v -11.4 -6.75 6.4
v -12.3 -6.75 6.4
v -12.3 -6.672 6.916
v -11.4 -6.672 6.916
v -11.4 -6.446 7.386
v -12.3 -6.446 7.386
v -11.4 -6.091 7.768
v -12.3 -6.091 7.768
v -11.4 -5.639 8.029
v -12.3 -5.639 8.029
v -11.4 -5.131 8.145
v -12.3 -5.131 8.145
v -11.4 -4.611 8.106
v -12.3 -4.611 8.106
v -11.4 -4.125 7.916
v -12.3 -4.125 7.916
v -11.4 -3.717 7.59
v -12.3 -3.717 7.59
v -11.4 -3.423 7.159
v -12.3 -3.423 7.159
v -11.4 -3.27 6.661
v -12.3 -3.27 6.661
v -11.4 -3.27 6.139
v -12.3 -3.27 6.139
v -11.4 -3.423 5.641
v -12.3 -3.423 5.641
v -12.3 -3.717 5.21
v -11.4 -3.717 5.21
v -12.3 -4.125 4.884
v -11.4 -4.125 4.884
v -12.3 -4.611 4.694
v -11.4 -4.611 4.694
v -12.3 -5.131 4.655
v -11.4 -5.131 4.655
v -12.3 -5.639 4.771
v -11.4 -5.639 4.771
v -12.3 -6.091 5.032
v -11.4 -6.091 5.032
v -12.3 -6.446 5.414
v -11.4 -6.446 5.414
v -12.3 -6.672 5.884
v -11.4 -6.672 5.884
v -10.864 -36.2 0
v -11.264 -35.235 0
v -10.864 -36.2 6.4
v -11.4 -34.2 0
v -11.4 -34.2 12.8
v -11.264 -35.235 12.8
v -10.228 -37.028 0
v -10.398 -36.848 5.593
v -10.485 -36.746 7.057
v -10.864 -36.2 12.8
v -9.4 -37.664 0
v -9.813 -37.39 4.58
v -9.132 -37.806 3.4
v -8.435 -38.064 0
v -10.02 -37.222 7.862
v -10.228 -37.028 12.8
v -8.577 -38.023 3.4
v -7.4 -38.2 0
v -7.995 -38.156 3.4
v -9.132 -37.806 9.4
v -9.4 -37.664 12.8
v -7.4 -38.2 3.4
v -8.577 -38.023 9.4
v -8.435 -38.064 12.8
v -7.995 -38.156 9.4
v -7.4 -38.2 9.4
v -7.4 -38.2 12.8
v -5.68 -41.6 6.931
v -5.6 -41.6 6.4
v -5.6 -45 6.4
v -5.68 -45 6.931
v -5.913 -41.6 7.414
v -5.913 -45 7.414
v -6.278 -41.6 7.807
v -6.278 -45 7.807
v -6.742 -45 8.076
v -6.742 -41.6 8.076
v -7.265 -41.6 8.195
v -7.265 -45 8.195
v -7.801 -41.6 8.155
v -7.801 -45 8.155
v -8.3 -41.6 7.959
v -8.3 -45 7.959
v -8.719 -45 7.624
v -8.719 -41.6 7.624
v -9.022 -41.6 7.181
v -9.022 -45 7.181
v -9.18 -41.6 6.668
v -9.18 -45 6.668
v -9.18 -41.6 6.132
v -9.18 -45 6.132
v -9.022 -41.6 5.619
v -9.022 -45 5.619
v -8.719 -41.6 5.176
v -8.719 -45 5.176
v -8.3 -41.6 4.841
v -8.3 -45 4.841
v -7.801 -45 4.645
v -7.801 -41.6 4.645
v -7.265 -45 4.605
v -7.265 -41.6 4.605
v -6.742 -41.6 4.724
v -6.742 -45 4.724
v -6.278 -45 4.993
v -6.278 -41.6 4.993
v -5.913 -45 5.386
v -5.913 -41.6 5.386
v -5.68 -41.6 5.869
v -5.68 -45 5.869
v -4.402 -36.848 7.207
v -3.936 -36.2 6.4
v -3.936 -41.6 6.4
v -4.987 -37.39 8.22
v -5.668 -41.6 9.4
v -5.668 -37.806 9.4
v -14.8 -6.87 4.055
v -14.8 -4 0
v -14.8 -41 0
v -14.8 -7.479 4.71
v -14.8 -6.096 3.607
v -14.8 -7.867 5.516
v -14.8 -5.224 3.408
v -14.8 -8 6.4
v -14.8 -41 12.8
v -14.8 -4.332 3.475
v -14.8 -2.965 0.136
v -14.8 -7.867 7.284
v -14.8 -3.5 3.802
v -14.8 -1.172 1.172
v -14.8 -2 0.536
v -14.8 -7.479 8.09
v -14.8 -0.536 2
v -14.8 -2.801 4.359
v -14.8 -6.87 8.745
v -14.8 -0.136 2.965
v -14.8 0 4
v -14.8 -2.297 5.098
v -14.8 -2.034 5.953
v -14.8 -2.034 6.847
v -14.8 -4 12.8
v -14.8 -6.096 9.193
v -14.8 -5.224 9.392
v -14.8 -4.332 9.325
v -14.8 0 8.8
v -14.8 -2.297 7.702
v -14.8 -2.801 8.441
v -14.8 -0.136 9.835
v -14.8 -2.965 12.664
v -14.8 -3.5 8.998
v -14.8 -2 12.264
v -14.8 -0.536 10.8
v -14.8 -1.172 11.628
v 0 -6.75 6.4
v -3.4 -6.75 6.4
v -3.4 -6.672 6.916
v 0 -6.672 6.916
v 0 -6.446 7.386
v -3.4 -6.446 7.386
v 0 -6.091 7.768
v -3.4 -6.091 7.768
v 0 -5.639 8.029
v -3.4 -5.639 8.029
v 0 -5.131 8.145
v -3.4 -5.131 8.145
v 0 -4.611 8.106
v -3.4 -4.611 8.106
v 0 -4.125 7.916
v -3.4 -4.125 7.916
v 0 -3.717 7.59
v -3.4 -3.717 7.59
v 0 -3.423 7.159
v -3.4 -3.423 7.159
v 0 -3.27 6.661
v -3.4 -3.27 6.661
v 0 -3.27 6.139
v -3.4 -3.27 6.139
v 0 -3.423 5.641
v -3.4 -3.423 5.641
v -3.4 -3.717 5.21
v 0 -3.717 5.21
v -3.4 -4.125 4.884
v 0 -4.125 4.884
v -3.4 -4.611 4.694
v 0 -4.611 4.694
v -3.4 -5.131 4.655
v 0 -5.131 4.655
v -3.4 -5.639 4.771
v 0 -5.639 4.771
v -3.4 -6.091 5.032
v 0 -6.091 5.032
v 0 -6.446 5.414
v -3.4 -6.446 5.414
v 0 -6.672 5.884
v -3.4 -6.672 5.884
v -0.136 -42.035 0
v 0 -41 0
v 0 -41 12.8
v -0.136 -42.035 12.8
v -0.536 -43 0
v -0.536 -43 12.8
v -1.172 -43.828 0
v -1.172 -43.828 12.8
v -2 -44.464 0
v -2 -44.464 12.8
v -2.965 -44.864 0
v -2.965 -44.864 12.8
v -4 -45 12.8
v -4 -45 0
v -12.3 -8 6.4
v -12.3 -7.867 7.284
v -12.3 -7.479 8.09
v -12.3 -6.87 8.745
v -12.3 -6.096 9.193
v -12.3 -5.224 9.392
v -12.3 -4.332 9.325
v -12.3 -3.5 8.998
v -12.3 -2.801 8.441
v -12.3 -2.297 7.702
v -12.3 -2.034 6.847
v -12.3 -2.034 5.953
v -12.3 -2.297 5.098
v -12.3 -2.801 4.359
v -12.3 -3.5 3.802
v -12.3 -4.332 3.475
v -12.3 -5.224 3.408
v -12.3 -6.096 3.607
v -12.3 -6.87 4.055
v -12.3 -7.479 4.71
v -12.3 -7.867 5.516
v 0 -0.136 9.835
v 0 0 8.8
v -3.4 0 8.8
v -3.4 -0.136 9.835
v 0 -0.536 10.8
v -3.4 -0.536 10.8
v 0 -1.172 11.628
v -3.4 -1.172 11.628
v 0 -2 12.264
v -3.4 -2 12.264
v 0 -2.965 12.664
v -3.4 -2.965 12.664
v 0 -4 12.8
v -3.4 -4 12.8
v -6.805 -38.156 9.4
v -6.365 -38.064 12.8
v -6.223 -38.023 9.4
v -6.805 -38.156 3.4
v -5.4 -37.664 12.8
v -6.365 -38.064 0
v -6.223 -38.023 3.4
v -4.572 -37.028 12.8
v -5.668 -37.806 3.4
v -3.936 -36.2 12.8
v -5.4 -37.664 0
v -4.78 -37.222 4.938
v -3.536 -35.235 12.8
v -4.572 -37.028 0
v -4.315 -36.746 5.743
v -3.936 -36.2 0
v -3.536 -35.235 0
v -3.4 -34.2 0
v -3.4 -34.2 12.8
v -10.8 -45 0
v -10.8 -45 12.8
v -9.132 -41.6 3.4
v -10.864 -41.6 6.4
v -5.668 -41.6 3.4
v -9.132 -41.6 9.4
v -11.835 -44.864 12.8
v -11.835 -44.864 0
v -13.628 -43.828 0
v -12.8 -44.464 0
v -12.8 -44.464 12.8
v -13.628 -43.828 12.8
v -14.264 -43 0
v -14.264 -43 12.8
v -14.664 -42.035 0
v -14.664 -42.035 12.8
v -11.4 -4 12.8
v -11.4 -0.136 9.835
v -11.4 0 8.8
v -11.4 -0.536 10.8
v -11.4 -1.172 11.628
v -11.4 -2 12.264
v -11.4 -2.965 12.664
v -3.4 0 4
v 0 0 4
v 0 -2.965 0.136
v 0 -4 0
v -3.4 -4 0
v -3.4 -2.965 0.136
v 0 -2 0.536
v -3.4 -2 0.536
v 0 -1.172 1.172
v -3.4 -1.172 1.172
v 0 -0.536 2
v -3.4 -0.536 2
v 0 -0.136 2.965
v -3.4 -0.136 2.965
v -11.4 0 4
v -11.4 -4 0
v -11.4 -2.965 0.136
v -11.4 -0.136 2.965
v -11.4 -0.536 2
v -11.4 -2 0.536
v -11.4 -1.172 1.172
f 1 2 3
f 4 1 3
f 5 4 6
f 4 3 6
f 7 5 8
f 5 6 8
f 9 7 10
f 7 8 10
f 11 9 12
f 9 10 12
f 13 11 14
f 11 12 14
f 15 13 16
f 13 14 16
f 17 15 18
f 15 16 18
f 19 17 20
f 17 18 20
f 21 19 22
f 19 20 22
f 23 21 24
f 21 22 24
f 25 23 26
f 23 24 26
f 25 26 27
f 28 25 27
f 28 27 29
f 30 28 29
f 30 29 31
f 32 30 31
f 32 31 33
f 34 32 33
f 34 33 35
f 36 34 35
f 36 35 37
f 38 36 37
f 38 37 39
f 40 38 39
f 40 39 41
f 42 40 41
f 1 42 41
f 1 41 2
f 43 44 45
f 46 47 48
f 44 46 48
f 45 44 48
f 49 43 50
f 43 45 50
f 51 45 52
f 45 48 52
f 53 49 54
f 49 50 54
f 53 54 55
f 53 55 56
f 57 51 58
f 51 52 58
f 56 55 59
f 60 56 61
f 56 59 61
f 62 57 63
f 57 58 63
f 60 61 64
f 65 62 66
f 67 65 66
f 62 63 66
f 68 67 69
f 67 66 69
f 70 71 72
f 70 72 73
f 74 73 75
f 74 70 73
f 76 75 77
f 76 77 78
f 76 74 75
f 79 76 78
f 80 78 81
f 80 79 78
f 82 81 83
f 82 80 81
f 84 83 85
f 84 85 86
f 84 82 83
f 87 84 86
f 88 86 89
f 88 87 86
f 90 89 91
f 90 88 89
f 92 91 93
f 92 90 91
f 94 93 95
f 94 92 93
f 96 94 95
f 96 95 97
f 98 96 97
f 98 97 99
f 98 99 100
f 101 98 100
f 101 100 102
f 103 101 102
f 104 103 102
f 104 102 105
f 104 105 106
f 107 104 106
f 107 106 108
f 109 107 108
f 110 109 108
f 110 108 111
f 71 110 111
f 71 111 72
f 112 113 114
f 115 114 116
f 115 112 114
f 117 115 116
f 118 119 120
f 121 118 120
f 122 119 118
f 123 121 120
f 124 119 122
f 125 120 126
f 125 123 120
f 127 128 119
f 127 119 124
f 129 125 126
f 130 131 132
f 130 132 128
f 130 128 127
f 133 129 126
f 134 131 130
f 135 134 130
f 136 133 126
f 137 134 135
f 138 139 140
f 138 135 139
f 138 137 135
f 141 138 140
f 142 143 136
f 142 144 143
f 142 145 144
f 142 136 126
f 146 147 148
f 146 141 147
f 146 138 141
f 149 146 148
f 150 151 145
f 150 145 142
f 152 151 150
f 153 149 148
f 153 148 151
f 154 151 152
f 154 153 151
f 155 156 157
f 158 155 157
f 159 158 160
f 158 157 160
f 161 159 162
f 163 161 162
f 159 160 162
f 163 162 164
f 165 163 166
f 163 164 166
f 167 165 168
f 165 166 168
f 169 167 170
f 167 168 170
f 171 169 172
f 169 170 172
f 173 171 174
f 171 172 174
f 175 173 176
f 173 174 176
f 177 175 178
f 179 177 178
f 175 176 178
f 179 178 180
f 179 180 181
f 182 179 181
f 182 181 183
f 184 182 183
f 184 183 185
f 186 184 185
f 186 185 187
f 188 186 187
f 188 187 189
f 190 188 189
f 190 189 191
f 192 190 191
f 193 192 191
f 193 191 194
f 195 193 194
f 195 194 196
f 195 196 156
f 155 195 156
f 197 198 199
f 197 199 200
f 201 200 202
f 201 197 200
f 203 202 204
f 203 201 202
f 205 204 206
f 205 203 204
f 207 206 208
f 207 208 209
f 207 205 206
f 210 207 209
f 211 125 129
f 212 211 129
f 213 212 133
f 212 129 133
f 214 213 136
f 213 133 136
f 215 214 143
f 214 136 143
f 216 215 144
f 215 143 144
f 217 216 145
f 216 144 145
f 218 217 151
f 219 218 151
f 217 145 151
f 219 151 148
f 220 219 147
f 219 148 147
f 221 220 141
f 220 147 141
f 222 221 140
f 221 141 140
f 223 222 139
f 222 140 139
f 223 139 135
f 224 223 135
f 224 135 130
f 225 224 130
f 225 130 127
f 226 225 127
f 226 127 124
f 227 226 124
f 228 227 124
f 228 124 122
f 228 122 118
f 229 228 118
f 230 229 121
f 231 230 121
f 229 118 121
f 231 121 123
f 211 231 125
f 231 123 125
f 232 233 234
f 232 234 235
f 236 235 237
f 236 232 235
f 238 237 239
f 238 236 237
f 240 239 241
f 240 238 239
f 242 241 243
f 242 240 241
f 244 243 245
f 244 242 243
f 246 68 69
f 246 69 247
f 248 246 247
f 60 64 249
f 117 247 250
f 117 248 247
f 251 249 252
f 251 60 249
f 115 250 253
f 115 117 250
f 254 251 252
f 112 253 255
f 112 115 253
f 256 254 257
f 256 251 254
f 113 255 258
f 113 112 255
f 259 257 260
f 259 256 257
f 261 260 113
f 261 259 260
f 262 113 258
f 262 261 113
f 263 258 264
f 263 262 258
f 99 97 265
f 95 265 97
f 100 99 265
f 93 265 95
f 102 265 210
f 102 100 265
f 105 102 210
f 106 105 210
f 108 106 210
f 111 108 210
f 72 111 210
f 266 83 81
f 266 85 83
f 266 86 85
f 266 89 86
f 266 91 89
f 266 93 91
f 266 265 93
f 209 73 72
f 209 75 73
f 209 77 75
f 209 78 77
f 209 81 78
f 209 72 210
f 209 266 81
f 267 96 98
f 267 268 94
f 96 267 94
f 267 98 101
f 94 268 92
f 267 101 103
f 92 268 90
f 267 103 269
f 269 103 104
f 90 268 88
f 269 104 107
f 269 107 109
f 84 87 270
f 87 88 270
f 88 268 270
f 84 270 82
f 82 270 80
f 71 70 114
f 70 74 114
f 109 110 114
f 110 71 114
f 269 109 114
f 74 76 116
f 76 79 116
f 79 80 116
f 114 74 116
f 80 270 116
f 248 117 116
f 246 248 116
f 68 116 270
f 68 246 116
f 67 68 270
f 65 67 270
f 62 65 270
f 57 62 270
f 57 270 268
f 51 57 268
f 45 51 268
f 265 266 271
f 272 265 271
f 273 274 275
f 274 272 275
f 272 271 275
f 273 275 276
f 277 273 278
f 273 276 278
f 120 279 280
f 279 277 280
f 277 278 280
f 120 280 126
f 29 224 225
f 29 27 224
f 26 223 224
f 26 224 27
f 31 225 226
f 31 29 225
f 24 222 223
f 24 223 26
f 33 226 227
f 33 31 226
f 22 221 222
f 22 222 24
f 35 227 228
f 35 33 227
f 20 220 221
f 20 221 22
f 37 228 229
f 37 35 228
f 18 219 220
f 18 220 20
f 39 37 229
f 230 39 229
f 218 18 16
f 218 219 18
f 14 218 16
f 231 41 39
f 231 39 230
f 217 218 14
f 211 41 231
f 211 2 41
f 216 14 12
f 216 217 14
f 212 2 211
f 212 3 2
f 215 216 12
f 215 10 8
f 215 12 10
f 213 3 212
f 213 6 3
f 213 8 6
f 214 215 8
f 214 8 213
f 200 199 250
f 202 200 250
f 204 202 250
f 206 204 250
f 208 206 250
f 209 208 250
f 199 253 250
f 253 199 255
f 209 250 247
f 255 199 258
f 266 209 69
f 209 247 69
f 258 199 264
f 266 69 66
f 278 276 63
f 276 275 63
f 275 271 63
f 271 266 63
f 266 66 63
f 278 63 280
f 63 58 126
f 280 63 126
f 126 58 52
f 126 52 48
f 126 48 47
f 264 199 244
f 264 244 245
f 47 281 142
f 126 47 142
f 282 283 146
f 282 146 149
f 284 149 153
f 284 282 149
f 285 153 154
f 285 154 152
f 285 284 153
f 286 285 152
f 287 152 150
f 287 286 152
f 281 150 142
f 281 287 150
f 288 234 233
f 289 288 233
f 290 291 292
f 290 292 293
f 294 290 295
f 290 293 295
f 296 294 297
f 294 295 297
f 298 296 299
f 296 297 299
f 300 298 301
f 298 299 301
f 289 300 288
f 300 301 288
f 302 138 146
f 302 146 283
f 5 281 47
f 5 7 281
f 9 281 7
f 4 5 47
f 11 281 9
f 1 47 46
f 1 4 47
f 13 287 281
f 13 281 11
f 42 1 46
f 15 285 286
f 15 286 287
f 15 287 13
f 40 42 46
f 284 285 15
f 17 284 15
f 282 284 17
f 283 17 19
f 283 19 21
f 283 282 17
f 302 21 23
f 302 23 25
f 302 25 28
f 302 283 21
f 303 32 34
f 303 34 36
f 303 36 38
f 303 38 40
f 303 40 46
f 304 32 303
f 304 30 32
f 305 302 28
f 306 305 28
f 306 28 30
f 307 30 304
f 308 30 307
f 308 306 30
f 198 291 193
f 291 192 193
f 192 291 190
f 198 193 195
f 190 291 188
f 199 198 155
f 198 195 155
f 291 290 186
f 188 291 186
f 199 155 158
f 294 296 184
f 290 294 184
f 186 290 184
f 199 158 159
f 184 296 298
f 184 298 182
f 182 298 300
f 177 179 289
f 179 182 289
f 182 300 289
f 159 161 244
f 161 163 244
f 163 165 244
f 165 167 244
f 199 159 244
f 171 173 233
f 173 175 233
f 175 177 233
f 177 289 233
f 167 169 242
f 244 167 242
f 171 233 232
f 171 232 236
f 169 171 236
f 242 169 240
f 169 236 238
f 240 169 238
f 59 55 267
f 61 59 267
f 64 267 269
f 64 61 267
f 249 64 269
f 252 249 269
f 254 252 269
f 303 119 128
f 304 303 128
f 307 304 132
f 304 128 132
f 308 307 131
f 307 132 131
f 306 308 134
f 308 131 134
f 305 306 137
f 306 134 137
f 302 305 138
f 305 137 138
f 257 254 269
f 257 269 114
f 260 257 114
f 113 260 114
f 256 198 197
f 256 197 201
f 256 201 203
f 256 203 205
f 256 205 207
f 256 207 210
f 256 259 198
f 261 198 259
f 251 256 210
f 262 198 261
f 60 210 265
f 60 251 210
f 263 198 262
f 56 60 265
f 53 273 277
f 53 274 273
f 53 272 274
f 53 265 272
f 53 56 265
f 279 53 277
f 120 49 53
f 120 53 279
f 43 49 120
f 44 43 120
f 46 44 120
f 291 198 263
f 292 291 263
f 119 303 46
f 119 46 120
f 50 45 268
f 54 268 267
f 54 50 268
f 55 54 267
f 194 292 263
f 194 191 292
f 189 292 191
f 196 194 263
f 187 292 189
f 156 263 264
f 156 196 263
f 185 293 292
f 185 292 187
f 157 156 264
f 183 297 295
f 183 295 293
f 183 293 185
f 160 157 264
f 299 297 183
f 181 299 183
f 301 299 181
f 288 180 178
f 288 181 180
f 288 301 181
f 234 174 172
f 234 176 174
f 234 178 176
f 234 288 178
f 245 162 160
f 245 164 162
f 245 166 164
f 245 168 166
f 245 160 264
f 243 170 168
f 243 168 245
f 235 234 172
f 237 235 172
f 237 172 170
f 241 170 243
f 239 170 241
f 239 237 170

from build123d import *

# Parameters (mm, degrees)
F0_W         = 3.4
F0_H         = 12.8
F0_W_2       = 8
F0_R         = 1.8
F1_DEPTH     = 45
F2_R         = 1.75
F3_DEPTH     = 25
F2_R_2       = 3
F4_DEPTH     = 2.5
F0_H_2       = 0.6
F5_DEPTH     = 38.2
F6_T3_DEPTH  = 12.8
F6_S4_R      = 1.8
F6_T5_DEPTH  = 8
F6_T8_DEPTH  = 12.8
F6_S9_R      = 1.8
F6_T10_DEPTH = 8
F6_T14_DEPTH = 23.4
F6_T17_DEPTH = 23.4
F6_T20_DEPTH = 23.4
F6_T23_DEPTH = 23.4
F6_T26_DEPTH = 32.8
F6_T29_DEPTH = 32.8
F7_DEPTH     = 41.6


# Not quite as in the source:
# - a fillet or chamfer that OpenCascade refuses, or shapes differently, is made with other operations: its cross-section is extruded or revolved along the edge and cut away or added


with BuildPart() as f1:
    # F0 (on Front) → F1 (new body)
    with BuildSketch(Plane.XZ):
        with Locations((-1.7, 6.4)):
            Rectangle(F0_W, F0_H)
        with Locations((-7.4, 6.4)):
            Rectangle(F0_W_2, F0_H)
        Polygon((-10.8641016151, 6.4), (-9.1320508076, 9.4), (-5.6679491924, 9.4), (-3.9358983849, 6.4), (-5.6679491924, 3.4), (-9.1320508076, 3.4), align=None, mode=Mode.SUBTRACT)
        with Locations((-13.1, 6.4)):
            Rectangle(F0_W, F0_H)
        Polygon((-5.6679491924, 9.4), (-9.1320508076, 9.4), (-10.8641016151, 6.4), (-9.1320508076, 3.4), (-5.6679491924, 3.4), (-3.9358983849, 6.4), align=None)
        with Locations((-7.4, 6.4)):
            Circle(F0_R, mode=Mode.SUBTRACT)
    extrude(amount=F1_DEPTH)

    # F2 (on face) → F3 (cut)
    with BuildSketch(Plane(origin=(-14.8, 0, 0), x_dir=(0, -1, 0), z_dir=(-1, 0, 0))):
        with Locations((5, 6.4)):
            Circle(F2_R)
    extrude(amount=-F3_DEPTH, mode=Mode.SUBTRACT)

    # F2 (on face) → F4 (cut)
    with BuildSketch(Plane(origin=(-14.8, 0, 0), x_dir=(0, -1, 0), z_dir=(-1, 0, 0))):
        with Locations((5, 6.4)):
            Circle(F2_R_2)
        with Locations((5, 6.4)):
            Circle(F2_R, mode=Mode.SUBTRACT)
    extrude(amount=-F4_DEPTH, mode=Mode.SUBTRACT)

    # F0 (on Front) → F5 (cut)
    with BuildSketch(Plane.XZ):
        with Locations((-7.4, 13.1)):
            Rectangle(F0_W_2, F0_H_2)
        with Locations((-7.4, 6.4)):
            Rectangle(F0_W_2, F0_H)
        Polygon((-10.8641016151, 6.4), (-9.1320508076, 9.4), (-5.6679491924, 9.4), (-3.9358983849, 6.4), (-5.6679491924, 3.4), (-9.1320508076, 3.4), align=None, mode=Mode.SUBTRACT)
        with Locations((-7.4, -0.3)):
            Rectangle(F0_W_2, F0_H_2)
        Polygon((-5.6679491924, 9.4), (-9.1320508076, 9.4), (-10.8641016151, 6.4), (-9.1320508076, 3.4), (-5.6679491924, 3.4), (-3.9358983849, 6.4), align=None)
        with Locations((-7.4, 6.4)):
            Circle(F0_R, mode=Mode.SUBTRACT)
    extrude(amount=F5_DEPTH, mode=Mode.SUBTRACT)

    # F6: fillet of radius 4 on 8 edges, made by hand


with BuildPart() as f6_tool1:
    # F6_s2 → F6_t3 (new body)
    with BuildSketch(Plane.XY):
        with BuildLine():
            ThreePointArc((-7.4, -38.2), (-4.5715728753, -37.0284271247), (-3.4, -34.2))
            Line((-3.4, -34.2), (-3.4, -38.2))
            Line((-3.4, -38.2), (-7.4, -38.2))
        make_face()
    extrude(amount=F6_T3_DEPTH)

    # F6_s4 → F6_t5 (cut, symmetric)
    with BuildSketch(Plane.XZ.offset(36.2)):
        with Locations((-7.4, 6.4)):
            Circle(F6_S4_R)
    extrude(amount=F6_T5_DEPTH, both=True, mode=Mode.SUBTRACT)


with BuildPart() as f6_tool6:
    # F6_s7 → F6_t8 (new body)
    with BuildSketch(Plane.XY.offset(12.8)):
        with BuildLine():
            ThreePointArc((-11.4, -34.2), (-10.2284271247, -37.0284271247), (-7.4, -38.2))
            Line((-7.4, -38.2), (-11.4, -38.2))
            Line((-11.4, -38.2), (-11.4, -34.2))
        make_face()
    extrude(amount=-F6_T8_DEPTH)

    # F6_s9 → F6_t10 (cut, symmetric)
    with BuildSketch(Plane.XZ.offset(36.2)):
        with Locations((-7.4, 6.4)):
            Circle(F6_S9_R)
    extrude(amount=F6_T10_DEPTH, both=True, mode=Mode.SUBTRACT)


with BuildPart() as f1_1:
    add(f1.part)

    # F6_t11: union F6_tool1, F6_tool6
    add([f6_tool1.part, f6_tool6.part])


with BuildPart() as f6_tool12:
    # F6_s13 → F6_t14 (new body)
    with BuildSketch(Plane.YZ.offset(10)):
        with BuildLine():
            ThreePointArc((0, 8.8), (-1.1715728753, 11.6284271247), (-4, 12.8))
            Line((-4, 12.8), (0, 12.8))
            Line((0, 12.8), (0, 8.8))
        make_face()
    extrude(amount=-F6_T14_DEPTH)


with BuildPart() as f6_tool15:
    # F6_s16 → F6_t17 (new body)
    with BuildSketch(Plane.YZ.offset(-13.4)):
        with BuildLine():
            ThreePointArc((-4, 0), (-1.1715728753, 1.1715728753), (0, 4))
            Line((0, 4), (0, 0))
            Line((0, 0), (-4, 0))
        make_face()
    extrude(amount=F6_T17_DEPTH)


with BuildPart() as f6_tool18:
    # F6_s19 → F6_t20 (new body)
    with BuildSketch(Plane.YZ.offset(-24.8)):
        with BuildLine():
            ThreePointArc((-4, 0), (-1.1715728753, 1.1715728753), (0, 4))
            Line((0, 4), (0, 0))
            Line((0, 0), (-4, 0))
        make_face()
    extrude(amount=F6_T20_DEPTH)


with BuildPart() as f6_tool21:
    # F6_s22 → F6_t23 (new body)
    with BuildSketch(Plane.YZ.offset(-1.4)):
        with BuildLine():
            ThreePointArc((-4, 12.8), (-1.1715728753, 11.6284271247), (0, 8.8))
            Line((0, 8.8), (0, 12.8))
            Line((0, 12.8), (-4, 12.8))
        make_face()
    extrude(amount=-F6_T23_DEPTH)


with BuildPart() as f6_tool24:
    # F6_s25 → F6_t26 (new body)
    with BuildSketch(Plane.XY.offset(22.8)):
        with BuildLine():
            ThreePointArc((-10.8, -45), (-13.6284271247, -43.8284271247), (-14.8, -41))
            Line((-14.8, -41), (-14.8, -45))
            Line((-14.8, -45), (-10.8, -45))
        make_face()
    extrude(amount=-F6_T26_DEPTH)


with BuildPart() as f6_tool27:
    # F6_s28 → F6_t29 (new body)
    with BuildSketch(Plane.XY.offset(-10)):
        with BuildLine():
            ThreePointArc((0, -41), (-1.1715728753, -43.8284271247), (-4, -45))
            Line((-4, -45), (0, -45))
            Line((0, -45), (0, -41))
        make_face()
    extrude(amount=F6_T29_DEPTH)


with BuildPart() as f1_2:
    add(f1_1.part)

    # F6_t30: cut F6_tool12, F6_tool15, F6_tool18, F6_tool21, F6_tool24, F6_tool27
    add([f6_tool12.part, f6_tool15.part, f6_tool18.part, f6_tool21.part, f6_tool24.part, f6_tool27.part], mode=Mode.SUBTRACT)

    # F0 (on Front) → F7 (cut)
    with BuildSketch(Plane.XZ):
        Polygon((-5.6679491924, 9.4), (-9.1320508076, 9.4), (-10.8641016151, 6.4), (-9.1320508076, 3.4), (-5.6679491924, 3.4), (-3.9358983849, 6.4), align=None)
        with Locations((-7.4, 6.4)):
            Circle(F0_R, mode=Mode.SUBTRACT)
    extrude(amount=F7_DEPTH, mode=Mode.SUBTRACT)


solid = f1_2.part
